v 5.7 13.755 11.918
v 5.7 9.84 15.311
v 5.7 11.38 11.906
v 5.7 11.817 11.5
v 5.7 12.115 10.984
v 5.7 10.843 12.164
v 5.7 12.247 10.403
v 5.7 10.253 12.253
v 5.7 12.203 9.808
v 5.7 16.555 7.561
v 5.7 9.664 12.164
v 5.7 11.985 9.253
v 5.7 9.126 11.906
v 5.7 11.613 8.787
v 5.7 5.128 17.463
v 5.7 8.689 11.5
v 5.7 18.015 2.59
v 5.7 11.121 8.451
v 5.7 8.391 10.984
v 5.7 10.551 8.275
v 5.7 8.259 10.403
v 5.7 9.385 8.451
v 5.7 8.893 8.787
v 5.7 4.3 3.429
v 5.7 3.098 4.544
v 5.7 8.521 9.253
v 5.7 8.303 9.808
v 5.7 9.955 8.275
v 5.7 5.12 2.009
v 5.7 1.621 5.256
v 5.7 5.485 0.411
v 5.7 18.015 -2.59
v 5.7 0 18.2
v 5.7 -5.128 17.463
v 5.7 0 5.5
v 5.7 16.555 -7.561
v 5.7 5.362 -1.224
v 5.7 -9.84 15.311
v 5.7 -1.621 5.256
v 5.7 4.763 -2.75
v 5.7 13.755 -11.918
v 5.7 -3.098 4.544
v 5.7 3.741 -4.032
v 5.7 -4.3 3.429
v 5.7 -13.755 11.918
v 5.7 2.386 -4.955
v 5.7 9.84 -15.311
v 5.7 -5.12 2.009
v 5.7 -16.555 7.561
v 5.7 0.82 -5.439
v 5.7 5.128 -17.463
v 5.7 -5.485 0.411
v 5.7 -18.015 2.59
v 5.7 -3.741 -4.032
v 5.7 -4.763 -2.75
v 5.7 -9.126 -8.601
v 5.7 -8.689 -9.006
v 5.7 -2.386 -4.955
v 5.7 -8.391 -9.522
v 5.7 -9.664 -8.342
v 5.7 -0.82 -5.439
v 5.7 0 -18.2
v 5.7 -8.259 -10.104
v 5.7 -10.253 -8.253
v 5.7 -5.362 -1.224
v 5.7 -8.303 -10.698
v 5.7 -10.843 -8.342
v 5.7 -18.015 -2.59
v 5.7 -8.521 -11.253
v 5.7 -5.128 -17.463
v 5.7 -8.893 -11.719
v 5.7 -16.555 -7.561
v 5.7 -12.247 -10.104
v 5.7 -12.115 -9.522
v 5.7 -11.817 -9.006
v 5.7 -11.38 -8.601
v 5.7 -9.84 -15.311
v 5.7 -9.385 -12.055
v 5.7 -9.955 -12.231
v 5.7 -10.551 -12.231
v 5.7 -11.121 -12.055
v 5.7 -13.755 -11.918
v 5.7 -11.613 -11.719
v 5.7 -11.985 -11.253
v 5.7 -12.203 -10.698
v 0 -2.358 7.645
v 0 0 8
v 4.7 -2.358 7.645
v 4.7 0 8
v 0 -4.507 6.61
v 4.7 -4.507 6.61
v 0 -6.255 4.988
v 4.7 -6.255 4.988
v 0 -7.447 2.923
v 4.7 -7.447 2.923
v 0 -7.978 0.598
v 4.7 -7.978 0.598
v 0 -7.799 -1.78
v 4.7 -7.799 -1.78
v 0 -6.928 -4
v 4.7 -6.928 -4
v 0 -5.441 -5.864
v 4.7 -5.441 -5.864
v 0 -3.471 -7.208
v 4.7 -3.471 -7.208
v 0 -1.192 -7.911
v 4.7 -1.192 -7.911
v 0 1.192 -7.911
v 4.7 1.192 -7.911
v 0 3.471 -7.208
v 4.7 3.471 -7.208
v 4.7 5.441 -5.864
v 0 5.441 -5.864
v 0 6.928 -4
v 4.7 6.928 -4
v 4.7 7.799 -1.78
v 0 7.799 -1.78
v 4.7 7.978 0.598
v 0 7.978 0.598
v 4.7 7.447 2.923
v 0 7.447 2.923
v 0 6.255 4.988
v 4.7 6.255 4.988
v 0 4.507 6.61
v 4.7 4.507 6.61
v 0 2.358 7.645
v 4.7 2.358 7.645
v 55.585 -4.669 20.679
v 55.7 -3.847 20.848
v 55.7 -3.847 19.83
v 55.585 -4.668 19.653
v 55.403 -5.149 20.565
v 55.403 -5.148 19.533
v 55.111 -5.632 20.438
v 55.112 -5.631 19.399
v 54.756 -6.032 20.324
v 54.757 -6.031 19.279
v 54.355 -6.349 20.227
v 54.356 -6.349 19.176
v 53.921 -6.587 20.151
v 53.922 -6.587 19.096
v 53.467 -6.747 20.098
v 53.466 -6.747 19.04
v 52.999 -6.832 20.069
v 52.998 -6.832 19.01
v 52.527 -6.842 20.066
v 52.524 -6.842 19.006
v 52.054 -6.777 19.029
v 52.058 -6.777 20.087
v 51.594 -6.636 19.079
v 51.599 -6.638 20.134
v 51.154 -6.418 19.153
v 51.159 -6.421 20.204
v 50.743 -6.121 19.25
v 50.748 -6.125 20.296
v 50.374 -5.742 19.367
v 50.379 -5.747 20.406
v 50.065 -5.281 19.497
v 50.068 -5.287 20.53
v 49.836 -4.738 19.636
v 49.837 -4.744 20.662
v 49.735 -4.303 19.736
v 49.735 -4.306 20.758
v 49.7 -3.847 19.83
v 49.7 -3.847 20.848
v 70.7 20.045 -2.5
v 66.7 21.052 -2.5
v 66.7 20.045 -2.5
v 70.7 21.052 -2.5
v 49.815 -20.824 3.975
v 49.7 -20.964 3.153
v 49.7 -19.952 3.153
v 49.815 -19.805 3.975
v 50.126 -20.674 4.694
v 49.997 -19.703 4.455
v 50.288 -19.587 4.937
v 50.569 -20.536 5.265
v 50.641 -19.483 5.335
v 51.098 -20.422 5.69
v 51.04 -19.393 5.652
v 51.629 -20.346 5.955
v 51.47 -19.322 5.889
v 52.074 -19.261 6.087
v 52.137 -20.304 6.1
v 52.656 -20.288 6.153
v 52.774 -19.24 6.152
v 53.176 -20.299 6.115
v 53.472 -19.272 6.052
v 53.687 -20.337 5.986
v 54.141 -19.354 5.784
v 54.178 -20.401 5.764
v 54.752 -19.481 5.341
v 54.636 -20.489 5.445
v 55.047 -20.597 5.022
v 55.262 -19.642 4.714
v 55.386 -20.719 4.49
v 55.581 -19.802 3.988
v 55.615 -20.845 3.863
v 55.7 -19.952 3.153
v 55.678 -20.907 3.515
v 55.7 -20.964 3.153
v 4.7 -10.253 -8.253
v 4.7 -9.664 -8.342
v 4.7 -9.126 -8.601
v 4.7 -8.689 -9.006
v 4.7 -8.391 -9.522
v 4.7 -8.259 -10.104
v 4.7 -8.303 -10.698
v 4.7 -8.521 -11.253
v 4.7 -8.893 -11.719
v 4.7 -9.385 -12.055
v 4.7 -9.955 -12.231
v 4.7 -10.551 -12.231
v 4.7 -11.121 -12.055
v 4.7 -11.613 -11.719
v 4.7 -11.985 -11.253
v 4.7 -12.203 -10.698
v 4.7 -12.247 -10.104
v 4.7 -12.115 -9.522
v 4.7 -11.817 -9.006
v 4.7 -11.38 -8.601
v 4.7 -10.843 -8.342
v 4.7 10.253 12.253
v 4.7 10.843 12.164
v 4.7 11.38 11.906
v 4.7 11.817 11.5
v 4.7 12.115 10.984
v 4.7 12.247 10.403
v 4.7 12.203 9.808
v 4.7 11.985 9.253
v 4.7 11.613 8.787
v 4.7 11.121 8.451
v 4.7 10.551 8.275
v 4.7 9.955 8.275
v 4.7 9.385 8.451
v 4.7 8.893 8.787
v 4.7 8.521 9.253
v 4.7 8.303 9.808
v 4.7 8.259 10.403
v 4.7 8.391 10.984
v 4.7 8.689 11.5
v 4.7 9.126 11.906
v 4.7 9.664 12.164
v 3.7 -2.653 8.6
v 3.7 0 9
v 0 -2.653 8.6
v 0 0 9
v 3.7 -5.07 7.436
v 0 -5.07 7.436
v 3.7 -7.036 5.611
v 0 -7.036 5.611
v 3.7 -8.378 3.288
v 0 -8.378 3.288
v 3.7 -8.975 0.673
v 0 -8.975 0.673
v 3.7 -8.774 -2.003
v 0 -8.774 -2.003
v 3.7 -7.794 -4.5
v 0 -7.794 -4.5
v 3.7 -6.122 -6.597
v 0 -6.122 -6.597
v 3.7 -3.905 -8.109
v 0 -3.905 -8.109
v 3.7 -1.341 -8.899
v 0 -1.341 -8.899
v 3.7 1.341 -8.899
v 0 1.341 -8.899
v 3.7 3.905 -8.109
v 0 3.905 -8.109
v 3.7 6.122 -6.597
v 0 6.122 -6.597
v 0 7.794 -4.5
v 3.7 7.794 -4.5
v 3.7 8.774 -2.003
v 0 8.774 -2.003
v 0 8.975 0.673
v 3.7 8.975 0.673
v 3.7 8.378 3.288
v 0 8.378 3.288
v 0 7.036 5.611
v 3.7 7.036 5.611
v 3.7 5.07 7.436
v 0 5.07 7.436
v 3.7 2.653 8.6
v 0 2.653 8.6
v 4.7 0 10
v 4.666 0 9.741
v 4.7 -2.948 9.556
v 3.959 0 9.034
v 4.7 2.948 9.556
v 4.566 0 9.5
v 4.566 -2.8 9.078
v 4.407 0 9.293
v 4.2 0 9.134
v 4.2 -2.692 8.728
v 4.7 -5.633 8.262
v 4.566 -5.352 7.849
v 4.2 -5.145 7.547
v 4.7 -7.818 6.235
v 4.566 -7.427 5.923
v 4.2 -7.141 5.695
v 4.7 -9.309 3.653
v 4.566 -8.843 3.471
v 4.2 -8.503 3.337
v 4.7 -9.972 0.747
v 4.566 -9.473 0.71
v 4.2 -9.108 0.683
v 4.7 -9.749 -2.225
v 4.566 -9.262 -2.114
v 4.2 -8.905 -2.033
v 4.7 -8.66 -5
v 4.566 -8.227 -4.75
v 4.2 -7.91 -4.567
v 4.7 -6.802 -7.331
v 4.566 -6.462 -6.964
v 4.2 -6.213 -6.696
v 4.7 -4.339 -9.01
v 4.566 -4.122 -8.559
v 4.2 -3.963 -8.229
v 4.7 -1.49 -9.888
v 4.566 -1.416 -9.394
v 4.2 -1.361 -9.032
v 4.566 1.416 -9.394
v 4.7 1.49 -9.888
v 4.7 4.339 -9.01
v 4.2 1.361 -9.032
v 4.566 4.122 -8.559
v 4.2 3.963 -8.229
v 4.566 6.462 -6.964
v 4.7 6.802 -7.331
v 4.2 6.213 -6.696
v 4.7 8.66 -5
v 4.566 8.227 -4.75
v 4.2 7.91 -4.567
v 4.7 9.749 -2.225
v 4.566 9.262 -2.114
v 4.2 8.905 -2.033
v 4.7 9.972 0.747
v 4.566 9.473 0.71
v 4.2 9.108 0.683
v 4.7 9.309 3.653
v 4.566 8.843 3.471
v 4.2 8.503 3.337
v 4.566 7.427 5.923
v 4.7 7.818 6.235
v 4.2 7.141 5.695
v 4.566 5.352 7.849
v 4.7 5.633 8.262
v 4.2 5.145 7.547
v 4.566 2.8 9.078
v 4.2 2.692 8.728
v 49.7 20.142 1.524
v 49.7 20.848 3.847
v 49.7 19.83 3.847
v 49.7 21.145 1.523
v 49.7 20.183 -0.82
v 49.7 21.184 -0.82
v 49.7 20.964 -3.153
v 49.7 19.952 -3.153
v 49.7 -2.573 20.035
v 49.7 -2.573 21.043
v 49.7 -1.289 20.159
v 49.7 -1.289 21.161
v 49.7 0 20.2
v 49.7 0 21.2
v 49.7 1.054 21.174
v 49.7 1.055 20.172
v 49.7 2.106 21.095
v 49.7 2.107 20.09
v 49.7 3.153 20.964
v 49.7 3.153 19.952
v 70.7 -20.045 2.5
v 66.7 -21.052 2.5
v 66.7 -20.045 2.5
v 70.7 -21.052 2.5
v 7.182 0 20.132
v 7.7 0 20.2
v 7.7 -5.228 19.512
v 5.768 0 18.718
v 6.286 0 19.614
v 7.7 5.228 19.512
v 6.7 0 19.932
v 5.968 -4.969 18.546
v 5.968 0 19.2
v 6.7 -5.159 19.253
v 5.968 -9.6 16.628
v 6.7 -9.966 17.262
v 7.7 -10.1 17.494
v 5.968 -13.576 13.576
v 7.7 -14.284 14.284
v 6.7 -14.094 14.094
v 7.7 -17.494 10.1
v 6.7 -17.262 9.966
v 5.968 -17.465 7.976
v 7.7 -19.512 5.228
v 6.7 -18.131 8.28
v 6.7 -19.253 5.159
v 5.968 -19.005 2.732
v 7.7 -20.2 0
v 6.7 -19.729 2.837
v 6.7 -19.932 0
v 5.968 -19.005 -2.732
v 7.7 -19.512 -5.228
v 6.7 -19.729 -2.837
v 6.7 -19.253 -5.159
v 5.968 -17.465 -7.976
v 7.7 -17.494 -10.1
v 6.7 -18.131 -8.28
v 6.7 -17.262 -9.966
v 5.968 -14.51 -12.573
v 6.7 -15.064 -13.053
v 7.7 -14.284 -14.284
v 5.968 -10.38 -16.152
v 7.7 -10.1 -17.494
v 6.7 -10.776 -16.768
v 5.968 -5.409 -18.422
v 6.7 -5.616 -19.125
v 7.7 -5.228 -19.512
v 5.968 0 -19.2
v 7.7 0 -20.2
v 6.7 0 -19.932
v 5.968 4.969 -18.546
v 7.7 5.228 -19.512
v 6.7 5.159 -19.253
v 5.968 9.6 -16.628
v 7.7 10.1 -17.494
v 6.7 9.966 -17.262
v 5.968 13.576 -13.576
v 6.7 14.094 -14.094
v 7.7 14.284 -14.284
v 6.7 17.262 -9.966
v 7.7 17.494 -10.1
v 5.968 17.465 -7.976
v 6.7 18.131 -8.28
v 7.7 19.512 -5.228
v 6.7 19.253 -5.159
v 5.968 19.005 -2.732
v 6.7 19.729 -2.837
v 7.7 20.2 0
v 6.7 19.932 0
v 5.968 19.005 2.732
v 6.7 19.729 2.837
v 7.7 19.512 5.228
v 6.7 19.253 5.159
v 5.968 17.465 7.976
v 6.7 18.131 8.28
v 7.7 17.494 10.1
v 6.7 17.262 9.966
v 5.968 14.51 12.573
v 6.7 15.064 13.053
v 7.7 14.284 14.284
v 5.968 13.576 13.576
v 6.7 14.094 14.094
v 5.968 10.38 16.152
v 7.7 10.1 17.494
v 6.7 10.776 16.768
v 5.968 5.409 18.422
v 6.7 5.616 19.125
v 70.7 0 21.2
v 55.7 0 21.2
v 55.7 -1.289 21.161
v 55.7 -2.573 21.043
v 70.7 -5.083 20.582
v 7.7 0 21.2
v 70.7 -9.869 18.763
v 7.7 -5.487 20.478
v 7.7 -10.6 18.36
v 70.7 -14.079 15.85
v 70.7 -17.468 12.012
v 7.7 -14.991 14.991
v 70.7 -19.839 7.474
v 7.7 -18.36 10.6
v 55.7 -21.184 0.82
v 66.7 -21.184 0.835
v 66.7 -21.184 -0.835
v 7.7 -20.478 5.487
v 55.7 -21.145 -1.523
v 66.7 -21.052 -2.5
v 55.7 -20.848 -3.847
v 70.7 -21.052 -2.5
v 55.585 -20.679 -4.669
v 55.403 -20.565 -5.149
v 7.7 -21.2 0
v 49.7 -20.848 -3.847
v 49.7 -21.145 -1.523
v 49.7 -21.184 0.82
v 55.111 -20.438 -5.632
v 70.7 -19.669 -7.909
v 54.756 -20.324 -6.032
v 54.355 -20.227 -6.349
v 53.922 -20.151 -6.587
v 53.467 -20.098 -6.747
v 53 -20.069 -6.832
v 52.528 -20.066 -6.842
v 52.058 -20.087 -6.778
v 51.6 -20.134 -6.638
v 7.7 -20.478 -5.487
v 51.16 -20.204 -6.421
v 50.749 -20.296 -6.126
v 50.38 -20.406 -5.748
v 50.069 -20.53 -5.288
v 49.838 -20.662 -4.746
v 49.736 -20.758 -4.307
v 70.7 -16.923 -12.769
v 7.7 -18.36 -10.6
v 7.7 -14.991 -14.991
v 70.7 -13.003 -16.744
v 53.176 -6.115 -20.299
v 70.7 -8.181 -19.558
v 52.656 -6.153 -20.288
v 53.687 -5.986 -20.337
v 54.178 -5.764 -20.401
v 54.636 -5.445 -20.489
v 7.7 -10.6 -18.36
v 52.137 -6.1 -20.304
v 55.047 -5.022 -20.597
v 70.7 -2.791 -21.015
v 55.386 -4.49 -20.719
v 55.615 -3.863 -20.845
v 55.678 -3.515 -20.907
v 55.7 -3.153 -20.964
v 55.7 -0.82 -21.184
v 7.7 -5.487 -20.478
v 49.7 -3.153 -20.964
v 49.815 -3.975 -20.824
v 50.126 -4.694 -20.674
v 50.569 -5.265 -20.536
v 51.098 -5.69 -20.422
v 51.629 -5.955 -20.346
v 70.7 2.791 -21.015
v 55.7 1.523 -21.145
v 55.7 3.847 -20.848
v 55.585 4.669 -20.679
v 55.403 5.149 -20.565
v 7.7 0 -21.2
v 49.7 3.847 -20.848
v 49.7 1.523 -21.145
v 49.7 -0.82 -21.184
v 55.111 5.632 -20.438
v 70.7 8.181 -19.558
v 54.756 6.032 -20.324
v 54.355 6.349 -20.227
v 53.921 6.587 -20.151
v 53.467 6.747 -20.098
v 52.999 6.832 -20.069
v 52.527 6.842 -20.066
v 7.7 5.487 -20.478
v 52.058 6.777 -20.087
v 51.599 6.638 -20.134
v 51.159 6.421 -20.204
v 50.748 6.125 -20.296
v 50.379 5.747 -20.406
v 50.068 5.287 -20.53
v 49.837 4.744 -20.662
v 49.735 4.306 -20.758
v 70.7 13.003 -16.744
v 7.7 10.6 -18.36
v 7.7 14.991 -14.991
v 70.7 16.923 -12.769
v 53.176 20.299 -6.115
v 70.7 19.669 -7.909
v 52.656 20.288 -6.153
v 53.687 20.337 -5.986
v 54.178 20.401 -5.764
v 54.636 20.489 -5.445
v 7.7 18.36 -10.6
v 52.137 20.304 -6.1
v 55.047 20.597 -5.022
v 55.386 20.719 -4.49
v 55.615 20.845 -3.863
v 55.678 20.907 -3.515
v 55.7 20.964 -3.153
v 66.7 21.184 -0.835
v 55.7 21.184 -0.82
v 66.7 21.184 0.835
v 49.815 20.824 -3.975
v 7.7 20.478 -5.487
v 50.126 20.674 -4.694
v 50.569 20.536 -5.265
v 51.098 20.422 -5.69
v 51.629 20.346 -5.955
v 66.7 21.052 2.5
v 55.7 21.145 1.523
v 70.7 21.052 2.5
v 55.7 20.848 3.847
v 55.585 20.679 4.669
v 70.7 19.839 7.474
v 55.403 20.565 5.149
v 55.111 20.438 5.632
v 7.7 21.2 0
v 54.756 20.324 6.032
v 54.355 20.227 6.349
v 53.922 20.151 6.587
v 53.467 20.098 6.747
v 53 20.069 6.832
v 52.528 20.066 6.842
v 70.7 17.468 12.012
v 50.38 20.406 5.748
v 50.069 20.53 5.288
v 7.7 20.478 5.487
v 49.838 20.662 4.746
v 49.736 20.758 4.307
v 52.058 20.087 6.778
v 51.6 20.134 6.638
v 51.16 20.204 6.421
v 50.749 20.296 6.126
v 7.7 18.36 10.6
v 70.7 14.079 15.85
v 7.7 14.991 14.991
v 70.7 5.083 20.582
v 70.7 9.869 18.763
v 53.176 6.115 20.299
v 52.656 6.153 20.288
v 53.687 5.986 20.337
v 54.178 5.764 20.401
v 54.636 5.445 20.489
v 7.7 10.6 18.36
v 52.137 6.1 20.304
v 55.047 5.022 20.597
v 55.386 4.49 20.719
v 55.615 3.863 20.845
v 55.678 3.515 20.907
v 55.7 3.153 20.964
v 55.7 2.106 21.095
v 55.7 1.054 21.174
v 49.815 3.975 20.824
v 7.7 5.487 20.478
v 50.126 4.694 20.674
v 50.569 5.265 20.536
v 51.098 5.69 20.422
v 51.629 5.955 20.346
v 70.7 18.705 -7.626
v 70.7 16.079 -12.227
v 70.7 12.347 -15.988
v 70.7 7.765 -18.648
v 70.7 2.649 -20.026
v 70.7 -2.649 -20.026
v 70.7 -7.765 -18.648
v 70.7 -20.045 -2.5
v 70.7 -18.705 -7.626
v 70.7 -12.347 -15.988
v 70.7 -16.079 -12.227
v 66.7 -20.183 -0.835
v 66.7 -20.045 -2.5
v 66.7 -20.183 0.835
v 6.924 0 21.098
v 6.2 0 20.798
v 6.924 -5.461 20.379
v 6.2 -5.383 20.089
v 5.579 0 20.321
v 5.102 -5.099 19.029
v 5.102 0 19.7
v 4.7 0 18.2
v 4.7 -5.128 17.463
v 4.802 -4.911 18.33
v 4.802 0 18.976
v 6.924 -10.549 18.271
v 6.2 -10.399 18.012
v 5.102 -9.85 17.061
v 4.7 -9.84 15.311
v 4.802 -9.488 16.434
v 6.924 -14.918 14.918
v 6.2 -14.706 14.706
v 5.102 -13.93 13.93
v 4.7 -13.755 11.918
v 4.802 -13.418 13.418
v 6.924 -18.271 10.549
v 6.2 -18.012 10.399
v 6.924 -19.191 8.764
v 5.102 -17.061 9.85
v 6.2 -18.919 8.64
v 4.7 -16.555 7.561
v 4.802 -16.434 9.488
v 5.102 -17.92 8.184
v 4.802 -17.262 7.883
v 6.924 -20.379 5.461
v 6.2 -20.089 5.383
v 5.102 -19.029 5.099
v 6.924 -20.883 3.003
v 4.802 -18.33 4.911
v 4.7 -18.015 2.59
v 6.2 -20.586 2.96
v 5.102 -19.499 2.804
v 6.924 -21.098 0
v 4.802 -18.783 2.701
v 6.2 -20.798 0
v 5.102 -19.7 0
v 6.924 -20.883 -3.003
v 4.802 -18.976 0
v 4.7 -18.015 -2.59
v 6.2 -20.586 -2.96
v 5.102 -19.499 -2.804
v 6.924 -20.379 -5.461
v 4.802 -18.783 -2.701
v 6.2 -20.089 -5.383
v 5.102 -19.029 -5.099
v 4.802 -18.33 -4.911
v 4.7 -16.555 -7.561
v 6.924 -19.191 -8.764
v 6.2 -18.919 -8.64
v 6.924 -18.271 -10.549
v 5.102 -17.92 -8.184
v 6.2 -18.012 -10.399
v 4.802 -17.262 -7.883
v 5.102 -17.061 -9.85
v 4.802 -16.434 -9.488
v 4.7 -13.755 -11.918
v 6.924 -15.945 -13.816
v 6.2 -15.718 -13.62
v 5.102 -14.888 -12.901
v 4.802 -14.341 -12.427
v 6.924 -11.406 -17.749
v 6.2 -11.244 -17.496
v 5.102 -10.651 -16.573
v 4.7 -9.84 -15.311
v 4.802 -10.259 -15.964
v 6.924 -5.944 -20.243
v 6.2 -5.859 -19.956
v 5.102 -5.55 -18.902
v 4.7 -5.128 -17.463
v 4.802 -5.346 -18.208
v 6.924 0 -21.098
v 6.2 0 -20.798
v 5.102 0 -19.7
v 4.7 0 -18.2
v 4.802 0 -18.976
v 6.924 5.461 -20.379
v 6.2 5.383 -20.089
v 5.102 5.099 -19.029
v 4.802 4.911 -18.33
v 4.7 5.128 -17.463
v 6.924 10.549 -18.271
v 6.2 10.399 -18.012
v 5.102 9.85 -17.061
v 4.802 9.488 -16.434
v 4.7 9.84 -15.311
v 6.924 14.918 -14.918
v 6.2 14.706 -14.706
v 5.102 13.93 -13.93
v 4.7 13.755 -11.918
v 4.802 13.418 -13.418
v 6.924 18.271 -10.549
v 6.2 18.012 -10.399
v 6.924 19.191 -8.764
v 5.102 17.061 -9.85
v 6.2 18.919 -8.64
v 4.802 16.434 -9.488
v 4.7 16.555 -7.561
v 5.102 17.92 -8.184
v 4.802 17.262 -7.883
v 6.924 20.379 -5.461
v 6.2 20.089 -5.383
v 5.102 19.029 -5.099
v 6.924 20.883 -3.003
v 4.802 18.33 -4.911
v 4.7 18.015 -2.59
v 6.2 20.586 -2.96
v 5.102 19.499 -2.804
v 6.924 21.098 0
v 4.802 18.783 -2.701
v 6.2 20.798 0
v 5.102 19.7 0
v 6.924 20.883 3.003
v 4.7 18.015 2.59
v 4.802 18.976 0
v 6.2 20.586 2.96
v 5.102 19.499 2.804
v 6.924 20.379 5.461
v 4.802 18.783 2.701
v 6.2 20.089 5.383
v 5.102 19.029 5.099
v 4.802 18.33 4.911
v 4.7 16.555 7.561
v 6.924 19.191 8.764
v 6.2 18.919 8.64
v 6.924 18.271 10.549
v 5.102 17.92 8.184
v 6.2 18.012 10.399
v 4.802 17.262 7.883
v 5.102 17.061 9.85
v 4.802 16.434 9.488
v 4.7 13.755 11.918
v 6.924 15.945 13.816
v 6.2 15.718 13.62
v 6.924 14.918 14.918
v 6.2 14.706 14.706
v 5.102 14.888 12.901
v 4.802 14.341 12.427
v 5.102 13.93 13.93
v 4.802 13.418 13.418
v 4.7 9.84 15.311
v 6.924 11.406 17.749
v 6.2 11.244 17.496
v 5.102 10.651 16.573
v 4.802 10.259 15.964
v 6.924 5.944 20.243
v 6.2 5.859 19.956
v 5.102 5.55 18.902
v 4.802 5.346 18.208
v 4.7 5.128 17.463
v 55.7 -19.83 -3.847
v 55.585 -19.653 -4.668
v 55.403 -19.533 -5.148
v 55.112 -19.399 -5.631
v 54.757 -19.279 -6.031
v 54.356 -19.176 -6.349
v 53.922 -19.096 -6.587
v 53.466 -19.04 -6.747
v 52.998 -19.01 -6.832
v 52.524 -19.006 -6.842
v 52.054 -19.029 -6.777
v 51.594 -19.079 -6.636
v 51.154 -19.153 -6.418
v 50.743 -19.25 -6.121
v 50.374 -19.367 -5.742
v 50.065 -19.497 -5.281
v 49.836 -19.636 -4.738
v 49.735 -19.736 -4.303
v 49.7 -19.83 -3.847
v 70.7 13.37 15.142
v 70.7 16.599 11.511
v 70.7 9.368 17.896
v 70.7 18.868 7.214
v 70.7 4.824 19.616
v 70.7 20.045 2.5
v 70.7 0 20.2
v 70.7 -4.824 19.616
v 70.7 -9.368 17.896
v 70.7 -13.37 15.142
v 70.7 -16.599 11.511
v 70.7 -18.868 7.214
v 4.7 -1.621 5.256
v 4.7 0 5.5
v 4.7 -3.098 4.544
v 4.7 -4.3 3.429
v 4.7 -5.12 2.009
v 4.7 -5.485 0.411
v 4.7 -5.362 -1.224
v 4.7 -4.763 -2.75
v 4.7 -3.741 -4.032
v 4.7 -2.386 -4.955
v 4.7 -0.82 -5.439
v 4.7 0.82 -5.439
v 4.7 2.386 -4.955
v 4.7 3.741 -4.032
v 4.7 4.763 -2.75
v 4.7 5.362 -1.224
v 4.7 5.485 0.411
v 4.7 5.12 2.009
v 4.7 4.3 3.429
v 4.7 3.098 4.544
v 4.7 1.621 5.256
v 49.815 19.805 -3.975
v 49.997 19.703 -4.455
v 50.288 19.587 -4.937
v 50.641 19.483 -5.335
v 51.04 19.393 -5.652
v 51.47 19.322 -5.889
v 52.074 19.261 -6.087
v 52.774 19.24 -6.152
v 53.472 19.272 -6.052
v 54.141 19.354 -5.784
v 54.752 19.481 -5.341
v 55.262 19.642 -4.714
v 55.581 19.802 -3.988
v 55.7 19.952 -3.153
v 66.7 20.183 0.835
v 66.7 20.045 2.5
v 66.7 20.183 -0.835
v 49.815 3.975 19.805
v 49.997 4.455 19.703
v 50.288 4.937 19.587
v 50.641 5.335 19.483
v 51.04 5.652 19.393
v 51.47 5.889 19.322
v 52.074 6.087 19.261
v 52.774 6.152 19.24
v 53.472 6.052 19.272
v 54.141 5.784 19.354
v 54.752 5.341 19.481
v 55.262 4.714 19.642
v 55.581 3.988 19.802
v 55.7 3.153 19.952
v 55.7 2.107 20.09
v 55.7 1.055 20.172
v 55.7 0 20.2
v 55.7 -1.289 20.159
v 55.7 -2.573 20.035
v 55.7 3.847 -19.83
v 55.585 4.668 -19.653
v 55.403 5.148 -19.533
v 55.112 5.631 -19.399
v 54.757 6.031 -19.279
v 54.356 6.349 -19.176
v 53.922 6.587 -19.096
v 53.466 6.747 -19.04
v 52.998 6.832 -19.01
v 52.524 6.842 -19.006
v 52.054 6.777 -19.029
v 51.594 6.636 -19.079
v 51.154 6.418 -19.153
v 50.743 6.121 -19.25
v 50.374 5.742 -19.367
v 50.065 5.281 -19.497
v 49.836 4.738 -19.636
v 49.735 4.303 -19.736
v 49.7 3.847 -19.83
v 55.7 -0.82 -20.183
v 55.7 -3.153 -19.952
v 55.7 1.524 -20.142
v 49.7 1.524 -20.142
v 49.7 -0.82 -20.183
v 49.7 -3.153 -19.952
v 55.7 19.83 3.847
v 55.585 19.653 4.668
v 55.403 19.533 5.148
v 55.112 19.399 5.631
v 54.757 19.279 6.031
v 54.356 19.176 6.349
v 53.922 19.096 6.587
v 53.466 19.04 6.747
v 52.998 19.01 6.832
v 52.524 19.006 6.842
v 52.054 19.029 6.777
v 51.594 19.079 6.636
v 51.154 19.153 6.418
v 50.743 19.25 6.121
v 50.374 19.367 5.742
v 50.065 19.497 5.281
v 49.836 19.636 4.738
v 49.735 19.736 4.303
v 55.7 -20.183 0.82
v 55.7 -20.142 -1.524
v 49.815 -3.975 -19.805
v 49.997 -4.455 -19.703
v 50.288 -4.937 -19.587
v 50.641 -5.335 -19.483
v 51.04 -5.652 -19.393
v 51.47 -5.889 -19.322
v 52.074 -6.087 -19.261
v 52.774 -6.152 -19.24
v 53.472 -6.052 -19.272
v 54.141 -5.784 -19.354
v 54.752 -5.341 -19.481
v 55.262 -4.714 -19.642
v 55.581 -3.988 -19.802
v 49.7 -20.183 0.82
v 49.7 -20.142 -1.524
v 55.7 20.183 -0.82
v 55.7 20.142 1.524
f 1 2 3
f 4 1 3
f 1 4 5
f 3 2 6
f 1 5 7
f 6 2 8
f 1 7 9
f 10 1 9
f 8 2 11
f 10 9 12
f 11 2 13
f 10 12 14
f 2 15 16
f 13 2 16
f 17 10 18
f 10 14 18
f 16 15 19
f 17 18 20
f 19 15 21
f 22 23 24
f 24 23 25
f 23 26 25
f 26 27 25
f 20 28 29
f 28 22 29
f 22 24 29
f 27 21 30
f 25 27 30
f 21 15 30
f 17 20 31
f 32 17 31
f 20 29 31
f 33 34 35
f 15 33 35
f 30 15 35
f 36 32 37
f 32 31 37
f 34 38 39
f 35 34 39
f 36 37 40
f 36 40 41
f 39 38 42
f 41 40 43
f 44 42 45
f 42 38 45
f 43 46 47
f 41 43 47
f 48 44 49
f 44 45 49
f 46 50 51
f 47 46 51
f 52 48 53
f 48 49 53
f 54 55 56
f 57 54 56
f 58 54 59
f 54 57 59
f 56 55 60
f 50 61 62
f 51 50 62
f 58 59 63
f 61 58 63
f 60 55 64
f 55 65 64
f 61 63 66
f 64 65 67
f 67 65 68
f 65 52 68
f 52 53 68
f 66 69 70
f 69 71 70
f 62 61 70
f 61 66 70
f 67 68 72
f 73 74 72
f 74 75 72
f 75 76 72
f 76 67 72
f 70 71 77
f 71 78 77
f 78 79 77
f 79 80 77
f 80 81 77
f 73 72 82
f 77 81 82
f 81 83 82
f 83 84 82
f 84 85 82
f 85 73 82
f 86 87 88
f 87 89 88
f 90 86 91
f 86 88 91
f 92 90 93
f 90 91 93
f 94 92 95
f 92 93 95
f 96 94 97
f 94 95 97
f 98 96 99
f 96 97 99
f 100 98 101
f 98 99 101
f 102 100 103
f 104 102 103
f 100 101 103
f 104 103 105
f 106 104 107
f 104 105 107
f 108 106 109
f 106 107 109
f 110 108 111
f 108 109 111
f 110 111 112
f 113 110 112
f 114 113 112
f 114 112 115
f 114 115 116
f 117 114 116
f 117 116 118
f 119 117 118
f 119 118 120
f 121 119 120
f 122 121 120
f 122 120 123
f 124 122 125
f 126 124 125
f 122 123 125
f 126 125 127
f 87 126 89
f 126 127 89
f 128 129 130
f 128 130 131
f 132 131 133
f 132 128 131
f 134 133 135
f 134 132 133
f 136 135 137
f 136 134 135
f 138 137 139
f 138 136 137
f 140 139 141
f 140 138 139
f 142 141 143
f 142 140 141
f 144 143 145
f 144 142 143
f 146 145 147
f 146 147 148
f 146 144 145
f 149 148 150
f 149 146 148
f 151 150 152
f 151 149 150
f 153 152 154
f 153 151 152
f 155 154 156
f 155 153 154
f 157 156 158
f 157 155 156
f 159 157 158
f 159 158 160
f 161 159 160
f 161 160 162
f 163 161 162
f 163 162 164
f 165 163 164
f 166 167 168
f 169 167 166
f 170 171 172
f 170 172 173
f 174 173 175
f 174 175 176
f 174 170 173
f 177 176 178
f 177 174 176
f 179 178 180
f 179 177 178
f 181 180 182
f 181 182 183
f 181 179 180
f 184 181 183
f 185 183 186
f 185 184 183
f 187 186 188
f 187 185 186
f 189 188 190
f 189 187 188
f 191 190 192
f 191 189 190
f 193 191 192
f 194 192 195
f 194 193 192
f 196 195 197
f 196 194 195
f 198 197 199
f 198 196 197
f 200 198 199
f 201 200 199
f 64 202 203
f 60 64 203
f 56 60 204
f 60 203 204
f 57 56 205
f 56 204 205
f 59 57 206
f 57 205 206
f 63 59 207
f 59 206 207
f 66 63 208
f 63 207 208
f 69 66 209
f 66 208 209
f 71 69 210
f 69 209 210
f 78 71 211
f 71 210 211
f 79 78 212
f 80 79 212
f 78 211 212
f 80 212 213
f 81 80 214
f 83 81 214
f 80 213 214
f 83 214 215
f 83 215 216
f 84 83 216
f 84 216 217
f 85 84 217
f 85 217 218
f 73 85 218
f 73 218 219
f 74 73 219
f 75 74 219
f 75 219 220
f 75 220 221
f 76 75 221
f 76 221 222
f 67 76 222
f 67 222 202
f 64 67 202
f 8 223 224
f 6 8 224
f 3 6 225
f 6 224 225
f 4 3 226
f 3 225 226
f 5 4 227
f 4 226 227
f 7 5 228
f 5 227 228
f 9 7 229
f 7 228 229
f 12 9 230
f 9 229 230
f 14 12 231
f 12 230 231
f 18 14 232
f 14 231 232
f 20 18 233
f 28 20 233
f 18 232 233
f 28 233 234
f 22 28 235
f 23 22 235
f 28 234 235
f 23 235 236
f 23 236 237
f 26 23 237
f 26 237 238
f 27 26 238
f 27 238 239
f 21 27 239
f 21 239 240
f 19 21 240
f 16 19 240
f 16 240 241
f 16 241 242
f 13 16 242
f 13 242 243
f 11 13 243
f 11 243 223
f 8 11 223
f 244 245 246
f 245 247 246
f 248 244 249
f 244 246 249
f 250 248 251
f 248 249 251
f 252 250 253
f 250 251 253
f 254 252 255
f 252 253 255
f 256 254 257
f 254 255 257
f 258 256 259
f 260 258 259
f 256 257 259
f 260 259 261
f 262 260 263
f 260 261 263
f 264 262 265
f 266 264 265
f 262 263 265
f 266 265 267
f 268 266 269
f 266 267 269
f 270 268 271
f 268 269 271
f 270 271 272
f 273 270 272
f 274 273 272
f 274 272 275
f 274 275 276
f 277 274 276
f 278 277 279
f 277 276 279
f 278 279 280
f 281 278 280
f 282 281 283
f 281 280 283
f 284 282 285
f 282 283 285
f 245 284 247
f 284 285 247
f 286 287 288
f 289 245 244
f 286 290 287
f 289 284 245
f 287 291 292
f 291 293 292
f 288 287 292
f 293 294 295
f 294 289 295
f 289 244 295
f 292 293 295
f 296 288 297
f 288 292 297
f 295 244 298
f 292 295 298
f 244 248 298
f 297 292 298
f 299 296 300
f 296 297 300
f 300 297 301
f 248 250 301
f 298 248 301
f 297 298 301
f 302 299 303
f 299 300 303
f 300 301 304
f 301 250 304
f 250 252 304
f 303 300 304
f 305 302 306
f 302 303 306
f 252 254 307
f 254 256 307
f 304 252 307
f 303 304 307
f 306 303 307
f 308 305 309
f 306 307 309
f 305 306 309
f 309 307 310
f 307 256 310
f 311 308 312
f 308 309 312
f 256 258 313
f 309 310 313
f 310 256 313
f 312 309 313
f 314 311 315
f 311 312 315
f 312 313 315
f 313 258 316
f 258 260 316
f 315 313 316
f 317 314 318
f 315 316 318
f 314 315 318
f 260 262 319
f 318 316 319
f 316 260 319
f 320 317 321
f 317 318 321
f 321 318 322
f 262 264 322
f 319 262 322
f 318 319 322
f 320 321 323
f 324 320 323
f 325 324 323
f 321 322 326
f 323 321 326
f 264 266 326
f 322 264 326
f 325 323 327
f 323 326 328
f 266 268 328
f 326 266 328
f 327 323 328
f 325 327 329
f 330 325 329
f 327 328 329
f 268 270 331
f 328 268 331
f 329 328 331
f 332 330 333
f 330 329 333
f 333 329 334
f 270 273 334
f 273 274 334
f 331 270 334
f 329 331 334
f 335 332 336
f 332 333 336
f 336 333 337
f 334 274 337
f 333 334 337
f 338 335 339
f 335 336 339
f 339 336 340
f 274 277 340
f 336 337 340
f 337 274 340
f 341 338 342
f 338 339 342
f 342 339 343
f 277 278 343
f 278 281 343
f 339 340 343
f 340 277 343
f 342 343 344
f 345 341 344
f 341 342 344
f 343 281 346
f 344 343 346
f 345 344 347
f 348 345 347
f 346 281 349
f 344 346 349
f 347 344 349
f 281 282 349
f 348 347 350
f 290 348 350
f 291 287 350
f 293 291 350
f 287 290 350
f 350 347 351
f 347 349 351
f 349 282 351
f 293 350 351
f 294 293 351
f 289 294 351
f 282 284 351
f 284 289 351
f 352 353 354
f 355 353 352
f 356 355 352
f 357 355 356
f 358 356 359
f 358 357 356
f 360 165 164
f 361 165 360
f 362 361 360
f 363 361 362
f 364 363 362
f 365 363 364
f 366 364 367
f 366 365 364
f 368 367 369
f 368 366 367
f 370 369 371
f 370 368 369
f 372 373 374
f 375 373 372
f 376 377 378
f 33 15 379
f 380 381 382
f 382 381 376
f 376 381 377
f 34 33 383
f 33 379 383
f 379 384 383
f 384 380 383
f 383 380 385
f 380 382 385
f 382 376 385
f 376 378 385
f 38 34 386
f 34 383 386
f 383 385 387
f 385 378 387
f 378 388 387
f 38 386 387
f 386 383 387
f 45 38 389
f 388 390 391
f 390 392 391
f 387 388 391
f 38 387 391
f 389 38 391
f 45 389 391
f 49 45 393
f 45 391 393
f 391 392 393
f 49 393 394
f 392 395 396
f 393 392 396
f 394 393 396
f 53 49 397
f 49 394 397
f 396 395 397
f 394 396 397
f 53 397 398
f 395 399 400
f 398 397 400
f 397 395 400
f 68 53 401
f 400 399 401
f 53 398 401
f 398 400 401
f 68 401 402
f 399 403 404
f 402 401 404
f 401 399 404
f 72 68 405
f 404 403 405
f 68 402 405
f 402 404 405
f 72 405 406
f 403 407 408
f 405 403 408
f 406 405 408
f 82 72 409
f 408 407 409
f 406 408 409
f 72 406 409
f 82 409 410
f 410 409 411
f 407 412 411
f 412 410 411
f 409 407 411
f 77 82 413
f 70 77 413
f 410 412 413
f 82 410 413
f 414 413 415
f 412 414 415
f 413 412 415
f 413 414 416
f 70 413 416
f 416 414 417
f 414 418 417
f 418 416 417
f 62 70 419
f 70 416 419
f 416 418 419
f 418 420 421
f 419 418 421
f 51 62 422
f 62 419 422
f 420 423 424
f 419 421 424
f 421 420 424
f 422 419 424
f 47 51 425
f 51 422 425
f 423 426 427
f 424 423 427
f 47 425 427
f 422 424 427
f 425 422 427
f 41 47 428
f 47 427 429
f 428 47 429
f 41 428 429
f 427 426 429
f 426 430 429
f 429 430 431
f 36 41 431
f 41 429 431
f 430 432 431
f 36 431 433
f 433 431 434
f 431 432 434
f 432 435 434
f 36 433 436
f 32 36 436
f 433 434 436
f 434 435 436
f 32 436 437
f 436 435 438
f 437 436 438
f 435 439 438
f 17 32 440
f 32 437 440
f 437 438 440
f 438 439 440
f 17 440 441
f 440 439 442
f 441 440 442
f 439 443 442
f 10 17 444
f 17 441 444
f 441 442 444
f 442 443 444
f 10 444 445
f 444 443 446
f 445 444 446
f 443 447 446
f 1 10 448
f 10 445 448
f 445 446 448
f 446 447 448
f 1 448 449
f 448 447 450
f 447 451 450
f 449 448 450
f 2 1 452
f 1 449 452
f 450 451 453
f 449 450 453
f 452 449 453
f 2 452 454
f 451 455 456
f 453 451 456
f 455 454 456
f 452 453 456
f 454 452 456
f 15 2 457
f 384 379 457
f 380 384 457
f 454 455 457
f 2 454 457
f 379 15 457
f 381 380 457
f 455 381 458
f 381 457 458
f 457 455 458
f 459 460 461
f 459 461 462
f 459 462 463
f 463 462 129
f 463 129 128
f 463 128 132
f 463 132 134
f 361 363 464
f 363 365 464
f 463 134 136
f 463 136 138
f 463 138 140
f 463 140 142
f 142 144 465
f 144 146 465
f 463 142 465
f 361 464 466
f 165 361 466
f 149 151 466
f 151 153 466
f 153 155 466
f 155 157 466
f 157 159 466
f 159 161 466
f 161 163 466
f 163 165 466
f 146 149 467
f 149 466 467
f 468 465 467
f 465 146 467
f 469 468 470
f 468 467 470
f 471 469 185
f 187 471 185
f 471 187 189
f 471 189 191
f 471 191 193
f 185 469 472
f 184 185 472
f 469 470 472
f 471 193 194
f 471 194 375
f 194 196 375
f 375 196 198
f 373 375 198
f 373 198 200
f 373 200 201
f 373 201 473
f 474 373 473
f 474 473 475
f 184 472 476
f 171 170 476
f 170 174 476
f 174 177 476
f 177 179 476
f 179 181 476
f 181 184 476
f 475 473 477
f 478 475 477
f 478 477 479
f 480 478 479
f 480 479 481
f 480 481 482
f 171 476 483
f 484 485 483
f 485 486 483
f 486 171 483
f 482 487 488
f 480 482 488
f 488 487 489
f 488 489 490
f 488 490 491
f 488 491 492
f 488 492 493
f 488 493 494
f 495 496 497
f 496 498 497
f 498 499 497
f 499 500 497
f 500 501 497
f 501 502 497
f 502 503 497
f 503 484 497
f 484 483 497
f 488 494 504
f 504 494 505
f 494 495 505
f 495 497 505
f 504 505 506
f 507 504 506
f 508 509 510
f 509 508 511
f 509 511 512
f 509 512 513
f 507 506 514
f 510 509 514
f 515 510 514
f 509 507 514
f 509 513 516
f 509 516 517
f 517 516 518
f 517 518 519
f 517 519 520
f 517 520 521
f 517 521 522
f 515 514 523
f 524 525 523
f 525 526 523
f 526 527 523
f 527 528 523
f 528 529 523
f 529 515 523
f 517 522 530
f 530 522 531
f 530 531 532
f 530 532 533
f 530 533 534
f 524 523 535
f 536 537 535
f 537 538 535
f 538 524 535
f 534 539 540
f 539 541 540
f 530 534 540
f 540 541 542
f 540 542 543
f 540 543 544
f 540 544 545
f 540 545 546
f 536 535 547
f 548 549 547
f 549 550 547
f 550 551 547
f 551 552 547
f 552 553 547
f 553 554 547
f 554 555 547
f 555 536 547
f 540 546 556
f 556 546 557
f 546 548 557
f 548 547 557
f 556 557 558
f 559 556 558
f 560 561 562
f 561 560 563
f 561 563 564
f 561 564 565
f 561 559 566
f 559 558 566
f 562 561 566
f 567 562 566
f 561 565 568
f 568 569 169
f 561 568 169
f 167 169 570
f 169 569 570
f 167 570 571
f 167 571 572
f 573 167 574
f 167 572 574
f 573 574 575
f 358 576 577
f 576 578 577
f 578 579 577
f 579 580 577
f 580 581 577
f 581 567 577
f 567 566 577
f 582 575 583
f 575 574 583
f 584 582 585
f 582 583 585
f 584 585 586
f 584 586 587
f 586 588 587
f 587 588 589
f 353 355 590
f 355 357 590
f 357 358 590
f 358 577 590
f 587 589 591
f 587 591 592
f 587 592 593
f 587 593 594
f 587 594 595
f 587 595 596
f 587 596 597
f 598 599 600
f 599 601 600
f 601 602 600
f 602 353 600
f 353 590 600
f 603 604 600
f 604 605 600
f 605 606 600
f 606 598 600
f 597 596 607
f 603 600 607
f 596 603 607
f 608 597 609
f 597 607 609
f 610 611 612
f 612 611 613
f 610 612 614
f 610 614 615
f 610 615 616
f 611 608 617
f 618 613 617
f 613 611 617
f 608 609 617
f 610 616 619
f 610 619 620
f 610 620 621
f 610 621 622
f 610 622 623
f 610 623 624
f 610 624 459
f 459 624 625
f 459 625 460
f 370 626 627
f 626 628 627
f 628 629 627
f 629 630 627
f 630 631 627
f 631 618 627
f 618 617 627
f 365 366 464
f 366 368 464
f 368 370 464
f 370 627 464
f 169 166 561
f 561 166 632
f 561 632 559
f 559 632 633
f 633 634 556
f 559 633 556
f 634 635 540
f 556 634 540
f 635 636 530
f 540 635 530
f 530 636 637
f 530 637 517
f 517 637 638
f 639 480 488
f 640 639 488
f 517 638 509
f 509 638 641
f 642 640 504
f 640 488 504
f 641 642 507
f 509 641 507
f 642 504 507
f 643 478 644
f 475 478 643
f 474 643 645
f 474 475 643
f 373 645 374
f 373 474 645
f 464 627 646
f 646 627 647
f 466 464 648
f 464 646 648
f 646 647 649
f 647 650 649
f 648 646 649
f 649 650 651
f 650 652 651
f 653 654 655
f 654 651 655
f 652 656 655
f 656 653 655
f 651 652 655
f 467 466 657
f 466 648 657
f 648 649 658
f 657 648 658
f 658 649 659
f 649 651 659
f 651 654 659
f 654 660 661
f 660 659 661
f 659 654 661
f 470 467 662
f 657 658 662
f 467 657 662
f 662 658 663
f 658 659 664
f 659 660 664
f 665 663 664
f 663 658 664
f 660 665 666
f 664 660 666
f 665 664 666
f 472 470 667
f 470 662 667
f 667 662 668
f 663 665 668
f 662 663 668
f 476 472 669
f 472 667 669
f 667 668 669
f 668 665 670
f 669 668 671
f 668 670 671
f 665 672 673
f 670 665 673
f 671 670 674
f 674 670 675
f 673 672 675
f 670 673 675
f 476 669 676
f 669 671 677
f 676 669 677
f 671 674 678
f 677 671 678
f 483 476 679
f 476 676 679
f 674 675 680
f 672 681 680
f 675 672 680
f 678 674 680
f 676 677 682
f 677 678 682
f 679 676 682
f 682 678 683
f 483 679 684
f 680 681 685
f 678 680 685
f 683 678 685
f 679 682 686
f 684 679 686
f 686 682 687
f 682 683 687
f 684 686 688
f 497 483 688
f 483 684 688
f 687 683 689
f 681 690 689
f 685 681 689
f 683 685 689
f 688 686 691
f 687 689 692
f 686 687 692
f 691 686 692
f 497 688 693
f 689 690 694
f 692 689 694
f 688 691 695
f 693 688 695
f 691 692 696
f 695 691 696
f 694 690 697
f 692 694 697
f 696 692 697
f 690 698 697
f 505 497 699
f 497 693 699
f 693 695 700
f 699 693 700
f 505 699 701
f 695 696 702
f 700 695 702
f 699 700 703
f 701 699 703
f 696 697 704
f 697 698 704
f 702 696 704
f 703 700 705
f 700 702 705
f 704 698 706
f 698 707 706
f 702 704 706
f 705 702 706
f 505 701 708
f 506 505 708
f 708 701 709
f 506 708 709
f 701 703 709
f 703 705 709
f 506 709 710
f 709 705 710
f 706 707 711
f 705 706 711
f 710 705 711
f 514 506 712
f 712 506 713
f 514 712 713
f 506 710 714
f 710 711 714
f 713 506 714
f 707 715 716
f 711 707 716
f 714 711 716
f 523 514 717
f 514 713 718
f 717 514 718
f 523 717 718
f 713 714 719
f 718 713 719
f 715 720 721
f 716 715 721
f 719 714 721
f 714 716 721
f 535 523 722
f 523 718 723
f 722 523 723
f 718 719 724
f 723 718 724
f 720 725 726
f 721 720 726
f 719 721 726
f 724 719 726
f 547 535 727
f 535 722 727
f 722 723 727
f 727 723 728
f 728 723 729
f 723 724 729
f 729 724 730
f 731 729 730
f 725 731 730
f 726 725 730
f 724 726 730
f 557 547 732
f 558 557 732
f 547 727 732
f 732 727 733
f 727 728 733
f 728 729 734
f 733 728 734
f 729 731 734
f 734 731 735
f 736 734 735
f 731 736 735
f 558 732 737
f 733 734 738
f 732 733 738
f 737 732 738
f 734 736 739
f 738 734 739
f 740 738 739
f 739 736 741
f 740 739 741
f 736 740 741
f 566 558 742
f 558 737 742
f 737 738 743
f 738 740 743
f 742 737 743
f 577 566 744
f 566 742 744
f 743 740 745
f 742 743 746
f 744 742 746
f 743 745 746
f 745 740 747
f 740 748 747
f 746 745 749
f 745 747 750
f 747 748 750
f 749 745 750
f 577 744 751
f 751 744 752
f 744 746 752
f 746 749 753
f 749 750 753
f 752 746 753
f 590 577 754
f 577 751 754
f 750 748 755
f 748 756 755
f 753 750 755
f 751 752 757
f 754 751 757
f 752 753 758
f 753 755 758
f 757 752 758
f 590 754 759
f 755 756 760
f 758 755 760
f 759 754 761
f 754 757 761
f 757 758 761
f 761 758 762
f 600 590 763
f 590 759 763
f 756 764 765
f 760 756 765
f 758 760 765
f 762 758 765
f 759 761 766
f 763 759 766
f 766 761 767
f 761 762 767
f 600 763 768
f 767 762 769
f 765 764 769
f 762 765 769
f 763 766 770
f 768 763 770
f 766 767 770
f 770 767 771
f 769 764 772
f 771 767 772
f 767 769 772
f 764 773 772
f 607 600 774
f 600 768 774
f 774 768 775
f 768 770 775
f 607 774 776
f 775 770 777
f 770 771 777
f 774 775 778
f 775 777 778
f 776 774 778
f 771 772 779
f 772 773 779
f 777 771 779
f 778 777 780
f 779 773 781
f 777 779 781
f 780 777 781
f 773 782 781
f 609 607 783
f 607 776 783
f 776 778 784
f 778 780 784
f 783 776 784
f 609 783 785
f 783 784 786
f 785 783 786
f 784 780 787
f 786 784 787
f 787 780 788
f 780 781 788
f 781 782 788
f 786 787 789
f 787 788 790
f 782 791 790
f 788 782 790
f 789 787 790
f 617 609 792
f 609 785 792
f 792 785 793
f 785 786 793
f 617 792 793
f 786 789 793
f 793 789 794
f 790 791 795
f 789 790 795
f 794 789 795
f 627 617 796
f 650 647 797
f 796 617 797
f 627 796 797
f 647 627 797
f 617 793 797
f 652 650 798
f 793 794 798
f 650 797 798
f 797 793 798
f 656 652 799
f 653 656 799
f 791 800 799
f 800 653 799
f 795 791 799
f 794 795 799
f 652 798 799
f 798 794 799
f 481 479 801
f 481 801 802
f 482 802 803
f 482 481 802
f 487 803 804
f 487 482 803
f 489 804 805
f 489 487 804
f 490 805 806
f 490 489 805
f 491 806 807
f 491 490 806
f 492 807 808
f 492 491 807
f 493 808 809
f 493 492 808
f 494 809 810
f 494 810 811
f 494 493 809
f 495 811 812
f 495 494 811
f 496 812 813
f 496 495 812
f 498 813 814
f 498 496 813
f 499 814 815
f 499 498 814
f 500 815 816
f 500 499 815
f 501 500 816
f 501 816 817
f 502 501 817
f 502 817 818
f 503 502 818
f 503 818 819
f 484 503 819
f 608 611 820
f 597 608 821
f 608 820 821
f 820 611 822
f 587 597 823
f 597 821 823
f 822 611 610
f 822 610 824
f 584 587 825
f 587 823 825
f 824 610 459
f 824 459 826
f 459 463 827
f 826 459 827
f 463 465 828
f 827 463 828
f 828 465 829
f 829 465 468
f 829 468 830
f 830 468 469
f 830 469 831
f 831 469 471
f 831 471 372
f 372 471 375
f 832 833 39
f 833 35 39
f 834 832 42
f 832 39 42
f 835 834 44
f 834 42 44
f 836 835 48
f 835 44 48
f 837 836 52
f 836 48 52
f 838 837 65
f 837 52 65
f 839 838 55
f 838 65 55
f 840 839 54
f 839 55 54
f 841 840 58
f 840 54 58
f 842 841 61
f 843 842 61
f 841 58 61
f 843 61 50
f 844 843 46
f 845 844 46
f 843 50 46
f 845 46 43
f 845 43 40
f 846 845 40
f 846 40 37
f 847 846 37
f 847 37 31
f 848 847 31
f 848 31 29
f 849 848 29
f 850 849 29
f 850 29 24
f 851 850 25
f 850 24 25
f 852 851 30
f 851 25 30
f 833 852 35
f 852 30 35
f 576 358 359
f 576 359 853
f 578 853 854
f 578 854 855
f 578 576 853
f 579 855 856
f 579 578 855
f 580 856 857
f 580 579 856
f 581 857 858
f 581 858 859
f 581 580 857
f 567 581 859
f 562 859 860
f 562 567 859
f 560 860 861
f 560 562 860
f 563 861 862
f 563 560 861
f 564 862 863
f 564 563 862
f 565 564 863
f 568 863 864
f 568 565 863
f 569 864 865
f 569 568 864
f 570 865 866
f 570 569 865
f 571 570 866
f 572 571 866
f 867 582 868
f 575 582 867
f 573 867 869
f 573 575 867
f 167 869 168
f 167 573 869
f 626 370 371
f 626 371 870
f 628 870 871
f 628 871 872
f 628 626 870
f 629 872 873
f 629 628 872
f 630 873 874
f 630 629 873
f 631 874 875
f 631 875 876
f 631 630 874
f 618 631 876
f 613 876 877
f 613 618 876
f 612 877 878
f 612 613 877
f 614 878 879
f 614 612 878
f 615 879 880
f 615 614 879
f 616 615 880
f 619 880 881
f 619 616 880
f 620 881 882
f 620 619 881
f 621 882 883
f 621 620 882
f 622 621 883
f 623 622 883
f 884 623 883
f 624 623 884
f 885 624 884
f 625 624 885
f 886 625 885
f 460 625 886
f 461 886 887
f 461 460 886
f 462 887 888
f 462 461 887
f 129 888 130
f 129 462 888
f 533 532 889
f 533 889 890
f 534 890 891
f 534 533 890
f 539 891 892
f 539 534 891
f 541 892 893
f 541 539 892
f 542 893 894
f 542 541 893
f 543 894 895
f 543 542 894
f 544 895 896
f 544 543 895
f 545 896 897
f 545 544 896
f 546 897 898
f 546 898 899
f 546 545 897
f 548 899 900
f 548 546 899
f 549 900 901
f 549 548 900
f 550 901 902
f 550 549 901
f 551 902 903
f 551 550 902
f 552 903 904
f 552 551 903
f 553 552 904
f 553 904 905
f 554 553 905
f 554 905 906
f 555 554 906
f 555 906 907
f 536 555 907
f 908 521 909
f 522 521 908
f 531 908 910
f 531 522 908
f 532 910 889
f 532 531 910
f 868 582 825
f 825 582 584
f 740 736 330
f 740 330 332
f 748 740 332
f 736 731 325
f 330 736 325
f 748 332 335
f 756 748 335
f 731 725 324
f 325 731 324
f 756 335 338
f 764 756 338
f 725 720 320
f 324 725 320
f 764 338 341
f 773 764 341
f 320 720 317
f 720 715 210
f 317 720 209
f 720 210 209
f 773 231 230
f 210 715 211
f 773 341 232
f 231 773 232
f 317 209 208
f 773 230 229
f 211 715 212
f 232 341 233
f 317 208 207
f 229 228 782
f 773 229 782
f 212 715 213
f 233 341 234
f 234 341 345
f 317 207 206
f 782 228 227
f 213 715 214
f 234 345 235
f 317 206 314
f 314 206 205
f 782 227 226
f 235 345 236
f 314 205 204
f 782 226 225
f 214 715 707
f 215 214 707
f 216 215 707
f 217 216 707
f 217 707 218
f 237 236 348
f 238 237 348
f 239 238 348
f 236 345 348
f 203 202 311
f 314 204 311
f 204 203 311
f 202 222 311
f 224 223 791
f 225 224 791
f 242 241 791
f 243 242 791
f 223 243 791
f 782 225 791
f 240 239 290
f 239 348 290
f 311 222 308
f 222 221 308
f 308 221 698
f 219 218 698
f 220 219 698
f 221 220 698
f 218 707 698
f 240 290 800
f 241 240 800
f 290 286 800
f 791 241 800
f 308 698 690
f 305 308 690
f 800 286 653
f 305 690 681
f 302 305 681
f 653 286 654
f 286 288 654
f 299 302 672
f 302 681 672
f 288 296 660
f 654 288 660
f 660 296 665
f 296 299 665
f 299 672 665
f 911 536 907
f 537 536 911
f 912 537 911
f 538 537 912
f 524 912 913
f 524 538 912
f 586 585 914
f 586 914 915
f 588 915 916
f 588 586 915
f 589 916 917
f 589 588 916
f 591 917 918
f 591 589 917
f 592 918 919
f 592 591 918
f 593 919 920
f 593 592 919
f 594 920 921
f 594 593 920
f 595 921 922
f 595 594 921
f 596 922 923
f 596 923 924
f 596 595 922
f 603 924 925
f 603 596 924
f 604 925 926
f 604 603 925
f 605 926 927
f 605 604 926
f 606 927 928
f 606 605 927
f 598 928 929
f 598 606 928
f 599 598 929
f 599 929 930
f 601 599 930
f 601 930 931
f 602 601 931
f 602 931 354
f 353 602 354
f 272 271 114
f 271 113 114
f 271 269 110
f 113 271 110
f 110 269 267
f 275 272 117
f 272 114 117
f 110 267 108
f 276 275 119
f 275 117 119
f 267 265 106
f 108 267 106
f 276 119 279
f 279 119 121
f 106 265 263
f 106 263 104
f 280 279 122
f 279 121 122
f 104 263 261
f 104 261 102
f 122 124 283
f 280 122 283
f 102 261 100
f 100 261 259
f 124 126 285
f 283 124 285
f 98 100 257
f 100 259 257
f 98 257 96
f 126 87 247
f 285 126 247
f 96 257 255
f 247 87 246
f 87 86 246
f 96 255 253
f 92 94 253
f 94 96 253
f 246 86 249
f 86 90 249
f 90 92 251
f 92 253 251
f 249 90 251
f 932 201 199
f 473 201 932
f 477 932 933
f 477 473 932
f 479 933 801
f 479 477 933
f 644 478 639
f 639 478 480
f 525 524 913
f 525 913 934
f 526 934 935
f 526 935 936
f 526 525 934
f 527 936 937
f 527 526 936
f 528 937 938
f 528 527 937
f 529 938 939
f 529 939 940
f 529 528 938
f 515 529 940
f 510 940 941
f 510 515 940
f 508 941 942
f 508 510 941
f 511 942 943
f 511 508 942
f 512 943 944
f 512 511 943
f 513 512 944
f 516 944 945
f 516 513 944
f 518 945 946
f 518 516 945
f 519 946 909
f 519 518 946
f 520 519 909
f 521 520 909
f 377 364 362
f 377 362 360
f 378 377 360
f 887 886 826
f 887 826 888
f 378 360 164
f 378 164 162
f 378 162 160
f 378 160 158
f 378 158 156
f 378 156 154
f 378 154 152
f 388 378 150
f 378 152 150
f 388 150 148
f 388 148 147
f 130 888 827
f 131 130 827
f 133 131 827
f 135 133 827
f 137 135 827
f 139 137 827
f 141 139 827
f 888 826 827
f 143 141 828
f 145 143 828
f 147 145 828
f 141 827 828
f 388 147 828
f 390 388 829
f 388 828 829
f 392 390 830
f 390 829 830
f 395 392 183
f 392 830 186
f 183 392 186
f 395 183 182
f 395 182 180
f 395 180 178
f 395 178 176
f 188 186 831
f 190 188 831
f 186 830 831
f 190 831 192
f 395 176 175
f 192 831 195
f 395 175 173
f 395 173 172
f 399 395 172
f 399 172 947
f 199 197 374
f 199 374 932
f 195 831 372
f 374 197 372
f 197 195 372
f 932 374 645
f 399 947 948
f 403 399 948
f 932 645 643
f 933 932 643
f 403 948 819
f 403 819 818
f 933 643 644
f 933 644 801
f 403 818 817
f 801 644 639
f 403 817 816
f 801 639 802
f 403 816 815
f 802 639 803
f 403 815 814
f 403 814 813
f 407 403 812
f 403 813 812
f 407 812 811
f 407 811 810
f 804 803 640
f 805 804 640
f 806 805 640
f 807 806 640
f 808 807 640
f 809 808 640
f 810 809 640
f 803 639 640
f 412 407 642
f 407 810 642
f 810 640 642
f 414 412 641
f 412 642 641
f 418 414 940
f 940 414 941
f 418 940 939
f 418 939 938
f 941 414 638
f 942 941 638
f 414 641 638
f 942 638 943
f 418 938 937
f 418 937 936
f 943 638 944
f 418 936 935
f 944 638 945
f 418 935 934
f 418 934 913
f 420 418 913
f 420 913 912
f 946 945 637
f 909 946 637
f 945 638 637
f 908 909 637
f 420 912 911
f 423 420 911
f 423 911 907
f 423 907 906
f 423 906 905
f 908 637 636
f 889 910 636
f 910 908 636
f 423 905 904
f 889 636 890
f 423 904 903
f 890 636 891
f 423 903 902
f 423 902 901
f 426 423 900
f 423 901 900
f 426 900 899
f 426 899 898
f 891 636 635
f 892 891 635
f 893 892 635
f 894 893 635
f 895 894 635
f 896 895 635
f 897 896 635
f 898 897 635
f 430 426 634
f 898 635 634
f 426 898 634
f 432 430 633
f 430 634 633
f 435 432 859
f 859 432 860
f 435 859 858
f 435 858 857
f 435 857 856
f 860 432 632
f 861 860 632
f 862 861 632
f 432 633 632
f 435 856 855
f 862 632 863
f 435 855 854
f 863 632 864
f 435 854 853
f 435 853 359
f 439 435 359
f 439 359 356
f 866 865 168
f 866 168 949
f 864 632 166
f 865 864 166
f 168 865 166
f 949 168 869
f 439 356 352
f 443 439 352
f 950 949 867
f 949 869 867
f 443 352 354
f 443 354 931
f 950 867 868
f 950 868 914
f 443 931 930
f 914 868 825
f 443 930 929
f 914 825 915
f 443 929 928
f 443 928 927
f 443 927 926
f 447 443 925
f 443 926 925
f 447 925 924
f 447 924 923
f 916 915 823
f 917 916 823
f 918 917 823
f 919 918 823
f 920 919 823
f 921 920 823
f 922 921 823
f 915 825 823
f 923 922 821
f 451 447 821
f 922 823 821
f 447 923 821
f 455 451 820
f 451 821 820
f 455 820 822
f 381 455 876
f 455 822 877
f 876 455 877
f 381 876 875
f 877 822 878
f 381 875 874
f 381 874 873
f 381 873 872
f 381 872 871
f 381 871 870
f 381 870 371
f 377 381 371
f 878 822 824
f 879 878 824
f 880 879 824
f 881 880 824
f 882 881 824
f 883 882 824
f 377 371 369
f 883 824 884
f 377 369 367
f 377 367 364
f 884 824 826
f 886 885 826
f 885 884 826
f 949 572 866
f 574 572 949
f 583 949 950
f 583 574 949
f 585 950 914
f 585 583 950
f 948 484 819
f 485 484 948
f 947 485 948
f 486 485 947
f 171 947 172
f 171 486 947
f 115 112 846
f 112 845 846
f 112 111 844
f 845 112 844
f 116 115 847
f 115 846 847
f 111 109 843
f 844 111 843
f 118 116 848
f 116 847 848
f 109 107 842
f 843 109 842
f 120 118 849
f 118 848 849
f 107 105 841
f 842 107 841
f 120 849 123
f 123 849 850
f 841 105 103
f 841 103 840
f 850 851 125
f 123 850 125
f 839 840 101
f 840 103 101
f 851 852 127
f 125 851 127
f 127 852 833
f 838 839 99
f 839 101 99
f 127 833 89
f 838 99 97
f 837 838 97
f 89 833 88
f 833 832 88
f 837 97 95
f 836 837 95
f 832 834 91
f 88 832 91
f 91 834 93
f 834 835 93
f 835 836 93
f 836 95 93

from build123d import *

# Parameters (mm, degrees)
CUT_EXTRUDE6_REACH      = 87.122
CUT_EXTRUDE6_END_RADIUS = 20.2
CIRPATTERN21_COUNT      = 4
SKETCH10_W              = 4
SKETCH10_H              = 5
CUT_EXTRUDE7_DEPTH      = 10
CIRPATTERN22_COUNT      = 2
CUT_EXTRUDE8_REACH      = 74.491
SKETCH13_R              = 2


with BuildPart() as part:
    # Sketch1 → Revolve2 (revolve)
    with BuildSketch(Plane.XY, mode=Mode.PRIVATE) as revolve2_sk:
        with BuildLine():
            Line((70.7, 21.2), (7.7, 21.2))
            ThreePointArc((7.7, 21.2), (5.578679656, 20.321320344), (4.7, 18.2))
            Line((4.7, 18.2), (4.7, 10))
            ThreePointArc((4.7, 10), (4.407106781, 9.292893219), (3.7, 9))
            Line((3.7, 9), (0, 9))
            Line((0, 9), (0, 8))
            Line((0, 8), (4.7, 8))
            Line((4.7, 8), (4.7, 5.5))
            Line((4.7, 5.5), (5.7, 5.5))
            Line((5.7, 5.5), (5.7, 8))
            Line((5.7, 8), (5.7, 18.2))
            ThreePointArc((5.7, 18.2), (6.285786438, 19.614213562), (7.7, 20.2))
            Line((7.7, 20.2), (70.7, 20.2))
            Line((70.7, 20.2), (70.7, 21.2))
        make_face()
    revolve(revolve2_sk.sketch.rotate(Axis((0, 0, 0), (1, 0, 0)), 90), axis=Axis((0, 0, 0), (1, 0, 0)))

    # Cut-Extrude6: up to this cylinder (the profile starts outside it)
    cut_extrude6_end = Plane(origin=(52.7, 0, 0), z_dir=(-1, 0, 0)) * Cylinder(CUT_EXTRUDE6_END_RADIUS, 215.644, mode=Mode.PRIVATE)
    # Sketch8 → Cut-Extrude6 (cut, up to the surface)
    with BuildSketch(Plane(origin=(70.7, 21.2, 0), x_dir=(1, 0, 0), z_dir=(0, 1, 0)), mode=Mode.PRIVATE) as cut_extrude6_sk1:
        with BuildLine():
            Line((-15, 3.153060045), (-15, -3.846939955))
            ThreePointArc((-15, -3.846939955), (-18, -6.846939955), (-21, -3.846939955))
            Line((-21, -3.846939955), (-21, 3.153060045))
            ThreePointArc((-21, 3.153060045), (-18, 6.153060045), (-15, 3.153060045))
        make_face()
    cut_extrude6_tool1 = extrude(cut_extrude6_sk1.sketch, amount=-CUT_EXTRUDE6_REACH, mode=Mode.PRIVATE) - cut_extrude6_end
    cut_extrude6 = cut_extrude6_tool1.solids().sort_by_distance((52.7, 21.2, 0.34694))[0]
    add(cut_extrude6, mode=Mode.SUBTRACT)

    # CirPattern21: Cut-Extrude6 ×4 about axis
    cirpattern21_axis = Axis((0, 0, 0), (-1, 0, 0))
    for i in range(1, CIRPATTERN21_COUNT):
        add(cut_extrude6.rotate(cirpattern21_axis, i * 360 / CIRPATTERN21_COUNT), mode=Mode.SUBTRACT)

    # Sketch10 → Cut-Extrude7 (cut)
    with BuildSketch(Plane(origin=(70.7, 21.2, 0), x_dir=(1, 0, 0), z_dir=(0, 1, 0))):
        with Locations((-2, 0)):
            Rectangle(SKETCH10_W, SKETCH10_H)
    cut_extrude7 = extrude(amount=-CUT_EXTRUDE7_DEPTH, mode=Mode.SUBTRACT)

    # CirPattern22: Cut-Extrude7 ×2 about axis
    cirpattern22_axis = Axis((0, 0, 0), (-1, 0, 0))
    for i in range(1, CIRPATTERN22_COUNT):
        add(cut_extrude7.rotate(cirpattern22_axis, i * 360 / CIRPATTERN22_COUNT), mode=Mode.SUBTRACT)

    # Sketch13 → Cut-Extrude8 (cut, up to next)
    with BuildSketch(Plane.ZY.offset(-4.7), mode=Mode.PRIVATE) as cut_extrude8_sk1:
        with Locations((10.253048327, 10.253048327)):
            Circle(SKETCH13_R)
    cut_extrude8_tool1 = extrude(cut_extrude8_sk1.sketch, amount=-CUT_EXTRUDE8_REACH, mode=Mode.PRIVATE) & part.part
    # Sketch13 → Cut-Extrude8 (cut, up to next)
    with BuildSketch(Plane.ZY.offset(-4.7), mode=Mode.PRIVATE) as cut_extrude8_sk2:
        with Locations((-10.253048327, -10.253048327)):
            Circle(SKETCH13_R)
    cut_extrude8_tool2 = extrude(cut_extrude8_sk2.sketch, amount=-CUT_EXTRUDE8_REACH, mode=Mode.PRIVATE) & part.part
    add(cut_extrude8_tool1.solids().sort_by_distance((4.7, 10.253048, 10.253048))[0], mode=Mode.SUBTRACT)
    add(cut_extrude8_tool2.solids().sort_by_distance((4.7, -10.253048, -10.253048))[0], mode=Mode.SUBTRACT)


solid = part.part
